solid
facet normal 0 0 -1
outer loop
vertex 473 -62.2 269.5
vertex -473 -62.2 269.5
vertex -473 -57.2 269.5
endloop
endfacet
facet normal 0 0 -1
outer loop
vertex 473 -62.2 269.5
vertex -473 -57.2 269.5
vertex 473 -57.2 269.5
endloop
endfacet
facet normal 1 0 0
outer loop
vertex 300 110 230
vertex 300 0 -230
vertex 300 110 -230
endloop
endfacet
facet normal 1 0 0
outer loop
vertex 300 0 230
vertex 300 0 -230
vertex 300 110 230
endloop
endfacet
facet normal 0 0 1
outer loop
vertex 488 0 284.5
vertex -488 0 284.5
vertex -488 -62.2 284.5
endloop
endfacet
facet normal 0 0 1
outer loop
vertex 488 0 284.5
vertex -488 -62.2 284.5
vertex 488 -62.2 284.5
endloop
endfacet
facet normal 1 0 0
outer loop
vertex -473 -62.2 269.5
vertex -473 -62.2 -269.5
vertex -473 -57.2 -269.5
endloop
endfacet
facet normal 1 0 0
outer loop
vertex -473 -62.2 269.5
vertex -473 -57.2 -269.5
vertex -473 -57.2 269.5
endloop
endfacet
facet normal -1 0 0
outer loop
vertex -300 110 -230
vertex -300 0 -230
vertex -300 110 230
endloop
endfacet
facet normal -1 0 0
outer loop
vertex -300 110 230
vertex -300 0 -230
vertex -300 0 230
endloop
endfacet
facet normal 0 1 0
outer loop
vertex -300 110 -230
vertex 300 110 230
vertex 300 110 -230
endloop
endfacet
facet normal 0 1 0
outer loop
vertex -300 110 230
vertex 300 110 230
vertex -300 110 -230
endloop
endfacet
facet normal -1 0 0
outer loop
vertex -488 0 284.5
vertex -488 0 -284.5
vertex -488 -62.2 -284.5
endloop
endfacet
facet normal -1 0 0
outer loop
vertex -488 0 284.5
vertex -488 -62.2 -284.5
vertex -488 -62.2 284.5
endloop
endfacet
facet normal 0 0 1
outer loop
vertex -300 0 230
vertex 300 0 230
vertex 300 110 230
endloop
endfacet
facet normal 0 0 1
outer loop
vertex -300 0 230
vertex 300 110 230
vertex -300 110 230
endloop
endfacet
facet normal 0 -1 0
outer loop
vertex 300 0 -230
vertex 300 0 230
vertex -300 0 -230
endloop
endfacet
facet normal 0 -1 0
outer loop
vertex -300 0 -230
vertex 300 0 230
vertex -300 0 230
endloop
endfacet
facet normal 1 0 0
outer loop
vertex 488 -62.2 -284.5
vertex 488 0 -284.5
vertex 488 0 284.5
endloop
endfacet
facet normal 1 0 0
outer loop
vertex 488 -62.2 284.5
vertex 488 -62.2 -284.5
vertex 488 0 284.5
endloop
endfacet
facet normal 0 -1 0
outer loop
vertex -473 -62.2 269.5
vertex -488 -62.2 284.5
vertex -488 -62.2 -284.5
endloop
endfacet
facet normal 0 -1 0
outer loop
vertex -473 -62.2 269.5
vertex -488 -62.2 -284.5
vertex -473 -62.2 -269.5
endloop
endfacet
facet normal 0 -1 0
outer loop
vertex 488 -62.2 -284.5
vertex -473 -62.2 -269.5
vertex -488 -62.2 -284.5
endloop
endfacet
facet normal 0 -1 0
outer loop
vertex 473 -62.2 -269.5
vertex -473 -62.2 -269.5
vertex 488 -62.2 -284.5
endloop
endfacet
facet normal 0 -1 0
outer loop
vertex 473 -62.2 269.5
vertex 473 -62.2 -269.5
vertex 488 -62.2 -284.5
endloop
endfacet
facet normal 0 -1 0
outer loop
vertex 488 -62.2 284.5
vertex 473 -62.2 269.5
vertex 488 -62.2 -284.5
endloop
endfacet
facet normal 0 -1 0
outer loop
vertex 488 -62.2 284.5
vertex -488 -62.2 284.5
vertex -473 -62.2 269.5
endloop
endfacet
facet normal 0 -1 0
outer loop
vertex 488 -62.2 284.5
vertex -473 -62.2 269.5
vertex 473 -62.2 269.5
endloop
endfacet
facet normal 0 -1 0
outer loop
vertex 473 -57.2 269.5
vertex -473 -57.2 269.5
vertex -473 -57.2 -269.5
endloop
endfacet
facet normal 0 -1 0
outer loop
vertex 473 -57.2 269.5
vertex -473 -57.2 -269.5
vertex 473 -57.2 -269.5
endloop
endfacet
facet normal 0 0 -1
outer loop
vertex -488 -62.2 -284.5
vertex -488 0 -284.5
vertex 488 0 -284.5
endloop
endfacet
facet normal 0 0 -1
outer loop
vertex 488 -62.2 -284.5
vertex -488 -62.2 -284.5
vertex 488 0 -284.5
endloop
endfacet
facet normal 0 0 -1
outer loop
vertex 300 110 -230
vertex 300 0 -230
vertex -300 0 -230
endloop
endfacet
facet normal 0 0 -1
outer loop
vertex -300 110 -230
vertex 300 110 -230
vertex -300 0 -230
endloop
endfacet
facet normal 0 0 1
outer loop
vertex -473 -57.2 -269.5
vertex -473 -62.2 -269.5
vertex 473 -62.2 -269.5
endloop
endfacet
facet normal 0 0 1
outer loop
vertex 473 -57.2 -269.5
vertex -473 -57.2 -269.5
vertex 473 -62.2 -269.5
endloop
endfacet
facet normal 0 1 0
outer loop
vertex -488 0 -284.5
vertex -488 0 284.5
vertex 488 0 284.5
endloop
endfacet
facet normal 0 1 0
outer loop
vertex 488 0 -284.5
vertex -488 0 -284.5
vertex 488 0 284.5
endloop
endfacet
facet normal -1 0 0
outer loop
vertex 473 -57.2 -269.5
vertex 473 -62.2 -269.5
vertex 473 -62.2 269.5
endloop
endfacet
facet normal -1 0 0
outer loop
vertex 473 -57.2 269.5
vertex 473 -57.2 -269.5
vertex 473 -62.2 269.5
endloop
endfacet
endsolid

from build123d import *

# Parameters (mm, degrees)
F0_W     = 976
F0_H     = 569
F1_DEPTH = 62.2
F2_W     = 946
F2_H     = 539
F3_DEPTH = 5
F4_W     = 600
F4_H     = 460
F5_DEPTH = 110


with BuildPart() as f1:
    # F0 (on Front) → F1 (new body)
    with BuildSketch(Plane.XZ):
        Rectangle(F0_W, F0_H)
    extrude(amount=F1_DEPTH)

    # F2 (on face) → F3 (cut)
    with BuildSketch(Plane.XZ.offset(62.2)):
        Rectangle(F2_W, F2_H)
    extrude(amount=-F3_DEPTH, mode=Mode.SUBTRACT)


with BuildPart() as f5:
    # F4 (on face) → F5 (new body)
    with BuildSketch(Plane(origin=(0, 0, 0), x_dir=(-1, 0, 0), z_dir=(0, 1, 0))):
        Rectangle(F4_W, F4_H)
    extrude(amount=F5_DEPTH)


solid = Compound([f1.part, f5.part])
